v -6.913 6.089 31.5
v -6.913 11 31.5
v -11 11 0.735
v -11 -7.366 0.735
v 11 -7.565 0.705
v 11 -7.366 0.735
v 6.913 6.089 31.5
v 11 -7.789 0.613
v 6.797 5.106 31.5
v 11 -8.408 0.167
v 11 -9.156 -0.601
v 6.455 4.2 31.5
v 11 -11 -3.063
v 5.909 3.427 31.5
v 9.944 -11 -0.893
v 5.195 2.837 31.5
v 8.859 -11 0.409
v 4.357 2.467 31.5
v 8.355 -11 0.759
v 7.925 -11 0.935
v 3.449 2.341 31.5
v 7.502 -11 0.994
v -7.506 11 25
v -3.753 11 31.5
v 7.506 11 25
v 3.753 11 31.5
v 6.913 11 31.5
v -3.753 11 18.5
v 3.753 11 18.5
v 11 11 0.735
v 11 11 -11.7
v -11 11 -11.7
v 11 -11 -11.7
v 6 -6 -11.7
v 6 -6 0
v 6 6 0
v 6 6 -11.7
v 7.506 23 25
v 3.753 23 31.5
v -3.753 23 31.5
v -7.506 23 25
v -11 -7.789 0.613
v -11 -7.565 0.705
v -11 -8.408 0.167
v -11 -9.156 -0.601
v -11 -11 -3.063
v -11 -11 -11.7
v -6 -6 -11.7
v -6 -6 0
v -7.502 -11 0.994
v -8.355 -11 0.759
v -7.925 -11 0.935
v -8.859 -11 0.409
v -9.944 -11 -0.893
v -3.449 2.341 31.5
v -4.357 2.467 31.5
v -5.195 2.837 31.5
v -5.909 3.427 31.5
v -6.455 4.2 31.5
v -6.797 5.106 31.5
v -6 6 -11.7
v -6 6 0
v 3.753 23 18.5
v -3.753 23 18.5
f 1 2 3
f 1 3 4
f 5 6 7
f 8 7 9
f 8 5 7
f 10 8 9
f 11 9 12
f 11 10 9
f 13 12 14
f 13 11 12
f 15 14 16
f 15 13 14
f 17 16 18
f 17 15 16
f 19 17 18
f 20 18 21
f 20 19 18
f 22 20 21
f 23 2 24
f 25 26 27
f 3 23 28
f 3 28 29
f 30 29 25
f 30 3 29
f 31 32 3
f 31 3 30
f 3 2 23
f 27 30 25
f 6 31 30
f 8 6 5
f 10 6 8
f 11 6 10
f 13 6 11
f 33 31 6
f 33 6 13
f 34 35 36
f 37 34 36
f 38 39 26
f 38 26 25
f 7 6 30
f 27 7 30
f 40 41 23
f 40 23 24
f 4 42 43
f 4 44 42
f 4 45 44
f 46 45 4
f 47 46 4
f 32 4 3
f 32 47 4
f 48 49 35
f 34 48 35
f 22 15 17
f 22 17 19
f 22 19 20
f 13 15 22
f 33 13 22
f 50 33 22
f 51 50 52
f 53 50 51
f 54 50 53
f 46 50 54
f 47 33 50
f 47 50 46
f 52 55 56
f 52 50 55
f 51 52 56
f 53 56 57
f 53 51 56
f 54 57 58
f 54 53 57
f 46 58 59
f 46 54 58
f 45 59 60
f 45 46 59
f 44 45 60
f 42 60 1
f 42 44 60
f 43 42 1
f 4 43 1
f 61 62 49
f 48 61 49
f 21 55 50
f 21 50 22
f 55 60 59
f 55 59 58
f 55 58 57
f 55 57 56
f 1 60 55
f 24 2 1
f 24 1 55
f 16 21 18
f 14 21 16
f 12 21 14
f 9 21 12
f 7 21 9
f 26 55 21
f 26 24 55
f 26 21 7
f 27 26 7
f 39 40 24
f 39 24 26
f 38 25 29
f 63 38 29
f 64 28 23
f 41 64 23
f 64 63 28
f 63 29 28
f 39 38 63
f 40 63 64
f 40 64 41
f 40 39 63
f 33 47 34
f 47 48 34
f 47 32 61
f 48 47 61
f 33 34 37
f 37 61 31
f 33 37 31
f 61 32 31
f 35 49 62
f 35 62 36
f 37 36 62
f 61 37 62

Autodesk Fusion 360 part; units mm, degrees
sketch "Sketch1" plane through (0, 0, 0) normal (0, 0, 1) x (1, 0, 0)
  line L0 (6, 6) -> (-6, 6)
  line L1 (-6, 6) -> (-6, -6)
  line L2 (-6, -6) -> (6, -6)
  line L3 (6, -6) -> (6, 6)
  line L4 (6, 6) -> (-6, -6) construction
  line L5 (-6, 6) -> (6, -6) construction
  line L6 (-11, 11) -> (11, 11)
  line L7 (11, 11) -> (11, -11)
  line L8 (11, -11) -> (-11, -11)
  line L9 (-11, -11) -> (-11, 11)
  line L10 (-11, 11) -> (11, -11) construction
  line L11 (11, 11) -> (-11, -11) construction
  dimension "d1" = 12
  dimension "d2" = 12
  dimension "d3" = 5
extrude "Extrude1" add sketch "Sketch1" against normal blind 11.7 makes body 1
extrude "Extrude2" add sketch "Sketch1" along normal blind 2 contours L0 L1 L2 L3 | L6 L7 L8 L9 bodies 1
ref_plane "WorkPlane2" through (0, 11, 2) normal (0, 1, 0) x (-1, 0, 0)
sketch "Sketch3" plane through (0, 11, 0) normal (0, 1, 0) x (-1, 0, 0)
  line L0 (-3.7528, 31.5) -> (-7.5056, 25)
  line L1 (-7.5056, 25) -> (-3.7528, 18.5)
  line L2 (-3.7528, 18.5) -> (3.7528, 18.5)
  line L3 (3.7528, 18.5) -> (7.5056, 25)
  line L4 (7.5056, 25) -> (3.7528, 31.5)
  line L5 (3.7528, 31.5) -> (-3.7528, 31.5)
  line L6 (-11, 2) -> (11, 2)
  point P0 (0, 25)
  dimension "d10" = 13
  dimension "d19" = 16.5
extrude "Extrude4" add sketch "Sketch3" along normal blind 12 separate body makes body 2
extrude "Extrude7" add 1 faces at (-3.6667, 3.6667, 2) along direction (0, 0, 1) up to surface (29.5 mm away) on bodies 1 bodies 1 2
chamfer "Chamfer2" distance 30.765 distance2 4.087 2 edges at (11, 0, 31.5) (-11, 0, 31.5) measured on face at (11, 3.6667, 2.7) measured on face at (-11, -3.6667, 17.1) on bodies 1
chamfer "Chamfer2" distance 30.506 distance2 13.341 1 edges at (0, -11, 31.5) measured on face at (3.6667, -11, 2.7) on bodies 1
fillet "Fillet2" radius 3.625 2 edges at (8.9393, -4.3295, 16.247) (-8.9393, -4.3295, 16.247) on bodies 1
equation "d19 = ( ( 27 / 2 ) * 1 mm ) + 3 mm"
